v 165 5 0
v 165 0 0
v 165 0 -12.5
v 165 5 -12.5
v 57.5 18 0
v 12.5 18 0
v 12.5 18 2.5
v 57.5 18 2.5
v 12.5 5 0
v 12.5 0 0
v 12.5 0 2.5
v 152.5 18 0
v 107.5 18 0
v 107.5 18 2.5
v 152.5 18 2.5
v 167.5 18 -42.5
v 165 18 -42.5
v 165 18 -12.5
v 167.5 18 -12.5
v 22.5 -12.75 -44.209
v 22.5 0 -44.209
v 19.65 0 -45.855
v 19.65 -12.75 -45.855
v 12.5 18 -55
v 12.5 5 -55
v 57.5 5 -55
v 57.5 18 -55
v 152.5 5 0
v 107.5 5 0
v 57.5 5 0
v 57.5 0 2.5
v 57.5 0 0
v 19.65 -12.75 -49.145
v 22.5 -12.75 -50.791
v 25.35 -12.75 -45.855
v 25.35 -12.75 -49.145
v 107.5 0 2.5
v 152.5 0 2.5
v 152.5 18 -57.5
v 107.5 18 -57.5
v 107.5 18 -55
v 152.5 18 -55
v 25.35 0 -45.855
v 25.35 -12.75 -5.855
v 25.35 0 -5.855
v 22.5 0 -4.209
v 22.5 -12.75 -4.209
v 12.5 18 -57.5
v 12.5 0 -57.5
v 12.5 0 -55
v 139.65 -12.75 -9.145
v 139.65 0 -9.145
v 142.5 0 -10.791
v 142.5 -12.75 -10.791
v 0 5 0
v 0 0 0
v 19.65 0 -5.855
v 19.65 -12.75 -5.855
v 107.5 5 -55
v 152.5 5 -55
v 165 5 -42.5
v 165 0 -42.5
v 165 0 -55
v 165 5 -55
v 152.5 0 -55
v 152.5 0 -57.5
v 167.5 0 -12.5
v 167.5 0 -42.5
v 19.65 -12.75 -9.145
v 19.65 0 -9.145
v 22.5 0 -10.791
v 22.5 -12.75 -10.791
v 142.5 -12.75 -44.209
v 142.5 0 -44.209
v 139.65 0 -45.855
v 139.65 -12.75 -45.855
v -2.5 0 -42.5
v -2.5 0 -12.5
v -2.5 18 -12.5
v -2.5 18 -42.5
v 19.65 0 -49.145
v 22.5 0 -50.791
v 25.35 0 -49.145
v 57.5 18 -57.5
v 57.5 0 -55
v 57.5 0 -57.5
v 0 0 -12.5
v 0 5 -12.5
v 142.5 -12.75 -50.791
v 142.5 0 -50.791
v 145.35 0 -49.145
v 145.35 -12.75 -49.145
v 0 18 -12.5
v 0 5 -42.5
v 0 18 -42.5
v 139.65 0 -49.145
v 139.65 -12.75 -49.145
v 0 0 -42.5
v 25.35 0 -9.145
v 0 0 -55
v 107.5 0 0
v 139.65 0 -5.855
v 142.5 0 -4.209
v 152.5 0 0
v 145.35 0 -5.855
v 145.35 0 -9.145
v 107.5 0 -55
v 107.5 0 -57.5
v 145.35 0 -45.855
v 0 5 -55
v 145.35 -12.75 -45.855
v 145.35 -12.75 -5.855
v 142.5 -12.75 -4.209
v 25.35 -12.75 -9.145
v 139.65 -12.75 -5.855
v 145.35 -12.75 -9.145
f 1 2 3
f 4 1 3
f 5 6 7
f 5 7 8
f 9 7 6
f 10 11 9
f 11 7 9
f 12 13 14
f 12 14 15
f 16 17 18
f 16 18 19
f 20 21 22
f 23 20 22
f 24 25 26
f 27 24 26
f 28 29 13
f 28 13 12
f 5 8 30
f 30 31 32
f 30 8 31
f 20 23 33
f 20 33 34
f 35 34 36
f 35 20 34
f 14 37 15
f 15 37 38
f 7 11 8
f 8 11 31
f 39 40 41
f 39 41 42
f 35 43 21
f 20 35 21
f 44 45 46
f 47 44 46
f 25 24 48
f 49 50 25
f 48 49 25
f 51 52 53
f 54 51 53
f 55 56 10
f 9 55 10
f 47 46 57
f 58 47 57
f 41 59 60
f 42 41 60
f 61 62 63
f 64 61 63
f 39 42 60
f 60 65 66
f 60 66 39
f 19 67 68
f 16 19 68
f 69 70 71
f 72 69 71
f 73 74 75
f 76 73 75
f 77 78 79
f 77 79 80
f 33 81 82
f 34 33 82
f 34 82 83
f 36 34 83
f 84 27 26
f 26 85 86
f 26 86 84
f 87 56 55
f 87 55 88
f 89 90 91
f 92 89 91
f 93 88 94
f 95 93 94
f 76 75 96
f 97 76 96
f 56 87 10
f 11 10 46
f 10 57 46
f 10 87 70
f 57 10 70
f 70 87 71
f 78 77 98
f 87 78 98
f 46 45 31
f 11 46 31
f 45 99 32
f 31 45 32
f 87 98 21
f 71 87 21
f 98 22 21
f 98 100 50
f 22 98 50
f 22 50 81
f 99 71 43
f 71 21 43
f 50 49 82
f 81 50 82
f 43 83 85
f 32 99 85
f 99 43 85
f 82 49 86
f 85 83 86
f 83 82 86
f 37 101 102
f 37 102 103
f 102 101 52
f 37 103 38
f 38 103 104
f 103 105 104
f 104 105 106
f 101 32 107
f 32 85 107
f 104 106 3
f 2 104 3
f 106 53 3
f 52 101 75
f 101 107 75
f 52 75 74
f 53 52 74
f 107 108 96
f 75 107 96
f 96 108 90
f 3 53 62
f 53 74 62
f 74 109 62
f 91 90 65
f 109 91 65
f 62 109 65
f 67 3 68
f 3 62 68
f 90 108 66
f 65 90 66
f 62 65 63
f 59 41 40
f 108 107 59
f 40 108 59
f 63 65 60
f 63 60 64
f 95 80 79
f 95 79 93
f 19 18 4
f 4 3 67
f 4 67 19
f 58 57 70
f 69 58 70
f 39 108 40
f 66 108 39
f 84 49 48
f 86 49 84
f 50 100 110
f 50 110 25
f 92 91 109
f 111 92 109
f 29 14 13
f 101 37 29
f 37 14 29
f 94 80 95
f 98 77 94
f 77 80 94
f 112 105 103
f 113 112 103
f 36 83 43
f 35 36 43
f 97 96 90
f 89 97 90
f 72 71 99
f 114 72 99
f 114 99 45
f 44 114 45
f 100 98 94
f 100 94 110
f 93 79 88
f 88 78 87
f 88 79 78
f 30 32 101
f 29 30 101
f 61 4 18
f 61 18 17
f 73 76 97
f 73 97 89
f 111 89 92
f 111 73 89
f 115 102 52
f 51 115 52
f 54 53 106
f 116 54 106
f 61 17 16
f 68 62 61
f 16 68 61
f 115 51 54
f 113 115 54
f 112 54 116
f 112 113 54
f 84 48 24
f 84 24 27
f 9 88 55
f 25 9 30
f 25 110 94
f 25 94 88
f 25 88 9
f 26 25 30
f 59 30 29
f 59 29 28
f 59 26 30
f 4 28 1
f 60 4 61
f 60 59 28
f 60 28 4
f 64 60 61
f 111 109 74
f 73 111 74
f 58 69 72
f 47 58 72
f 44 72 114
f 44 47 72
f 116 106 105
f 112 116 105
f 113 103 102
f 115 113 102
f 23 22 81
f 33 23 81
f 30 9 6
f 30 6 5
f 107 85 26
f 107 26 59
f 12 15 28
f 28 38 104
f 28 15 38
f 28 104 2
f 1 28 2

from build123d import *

# Parameters (mm, degrees)
SKETCH1_W           = 165
SKETCH1_H           = 55
BOSS_EXTRUDE1_DEPTH = 5
SKETCH2_W           = 2.5
SKETCH2_H           = 30
BOSS_EXTRUDE2_DEPTH = 18
SKETCH3_W           = 45
SKETCH3_H           = 2.5
BOSS_EXTRUDE3_DEPTH = 18
BOSS_EXTRUDE4_DEPTH = 12.75


with BuildPart() as part:
    # Sketch1 → Boss-Extrude1 (new body)
    with BuildSketch(Plane(origin=(0, 0, 0), x_dir=(1, 0, 0), z_dir=(0, 1, 0))):
        with Locations((82.5, 27.5)):
            Rectangle(SKETCH1_W, SKETCH1_H)
    extrude(amount=BOSS_EXTRUDE1_DEPTH)

    # Sketch2 → Boss-Extrude2 (add)
    with BuildSketch(Plane(origin=(0, 0, 0), x_dir=(1, 0, 0), z_dir=(0, 1, 0))):
        with Locations((166.25, 27.5)):
            Rectangle(SKETCH2_W, SKETCH2_H)
        with Locations((-1.25, 27.5)):
            Rectangle(SKETCH2_W, SKETCH2_H)
    extrude(amount=BOSS_EXTRUDE2_DEPTH)

    # Sketch3 → Boss-Extrude3 (add)
    with BuildSketch(Plane(origin=(0, 0, 0), x_dir=(1, 0, 0), z_dir=(0, 1, 0))):
        with Locations((130, 56.25)):
            Rectangle(SKETCH3_W, SKETCH3_H)
        with Locations((35, 56.25)):
            Rectangle(SKETCH3_W, SKETCH3_H)
        with Locations((130, -1.25)):
            Rectangle(SKETCH3_W, SKETCH3_H)
        with Locations((35, -1.25)):
            Rectangle(SKETCH3_W, SKETCH3_H)
    extrude(amount=BOSS_EXTRUDE3_DEPTH)

    # Sketch4 → Boss-Extrude4 (add)
    with BuildSketch(Plane.XZ):
        Polygon((139.65, -5.854551733), (139.65, -9.145448267), (142.5, -10.790896534), (145.35, -9.145448267), (145.35, -5.854551733), (142.5, -4.209103466), align=None)
        Polygon((22.5, -10.790896534), (25.35, -9.145448267), (25.35, -5.854551733), (22.5, -4.209103466), (19.65, -5.854551733), (19.65, -9.145448267), align=None)
        Polygon((22.5, -50.790896534), (25.35, -49.145448267), (25.35, -45.854551733), (22.5, -44.209103466), (19.65, -45.854551733), (19.65, -49.145448267), align=None)
        Polygon((145.35, -49.145448267), (145.35, -45.854551733), (142.5, -44.209103466), (139.65, -45.854551733), (139.65, -49.145448267), (142.5, -50.790896534), align=None)
    extrude(amount=BOSS_EXTRUDE4_DEPTH)


solid = part.part
